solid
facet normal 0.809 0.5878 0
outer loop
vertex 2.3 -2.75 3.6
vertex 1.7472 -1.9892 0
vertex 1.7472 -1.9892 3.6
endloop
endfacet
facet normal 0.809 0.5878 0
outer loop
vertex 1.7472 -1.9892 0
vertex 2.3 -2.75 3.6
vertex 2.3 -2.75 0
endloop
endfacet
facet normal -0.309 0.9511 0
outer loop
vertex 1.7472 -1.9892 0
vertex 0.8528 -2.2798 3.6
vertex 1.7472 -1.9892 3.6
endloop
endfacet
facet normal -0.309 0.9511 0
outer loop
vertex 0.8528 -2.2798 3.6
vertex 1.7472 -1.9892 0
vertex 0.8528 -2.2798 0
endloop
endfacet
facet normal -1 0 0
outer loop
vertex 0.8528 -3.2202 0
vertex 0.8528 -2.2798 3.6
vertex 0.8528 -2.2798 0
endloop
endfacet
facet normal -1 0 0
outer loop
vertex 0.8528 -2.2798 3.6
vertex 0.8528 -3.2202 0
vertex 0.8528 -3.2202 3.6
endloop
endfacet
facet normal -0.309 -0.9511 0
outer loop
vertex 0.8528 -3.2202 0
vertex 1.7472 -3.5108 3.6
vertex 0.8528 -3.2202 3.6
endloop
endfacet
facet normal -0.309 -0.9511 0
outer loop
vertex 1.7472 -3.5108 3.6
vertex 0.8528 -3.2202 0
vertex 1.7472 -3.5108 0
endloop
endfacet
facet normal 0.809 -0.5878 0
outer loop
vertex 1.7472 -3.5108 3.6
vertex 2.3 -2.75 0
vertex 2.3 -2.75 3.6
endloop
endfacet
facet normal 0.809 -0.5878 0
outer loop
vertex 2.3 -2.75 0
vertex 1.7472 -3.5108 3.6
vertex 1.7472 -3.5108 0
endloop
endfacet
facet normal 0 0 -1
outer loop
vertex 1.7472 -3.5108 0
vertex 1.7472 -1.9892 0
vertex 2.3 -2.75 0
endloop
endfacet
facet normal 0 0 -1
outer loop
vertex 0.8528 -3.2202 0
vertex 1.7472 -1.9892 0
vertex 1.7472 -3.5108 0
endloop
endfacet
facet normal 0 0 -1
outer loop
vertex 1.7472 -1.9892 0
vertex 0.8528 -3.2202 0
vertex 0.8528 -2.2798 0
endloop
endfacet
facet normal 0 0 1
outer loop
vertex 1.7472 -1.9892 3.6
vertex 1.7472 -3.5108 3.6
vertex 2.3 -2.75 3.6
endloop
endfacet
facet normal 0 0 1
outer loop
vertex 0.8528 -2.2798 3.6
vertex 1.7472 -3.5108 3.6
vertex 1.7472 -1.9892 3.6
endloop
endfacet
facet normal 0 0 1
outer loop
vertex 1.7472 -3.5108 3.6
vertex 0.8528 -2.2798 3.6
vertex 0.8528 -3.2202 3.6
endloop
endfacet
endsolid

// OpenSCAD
union() {
  translate([1.5, -2.75, 0.0]) cylinder(r=0.8, h=3.6);
}
